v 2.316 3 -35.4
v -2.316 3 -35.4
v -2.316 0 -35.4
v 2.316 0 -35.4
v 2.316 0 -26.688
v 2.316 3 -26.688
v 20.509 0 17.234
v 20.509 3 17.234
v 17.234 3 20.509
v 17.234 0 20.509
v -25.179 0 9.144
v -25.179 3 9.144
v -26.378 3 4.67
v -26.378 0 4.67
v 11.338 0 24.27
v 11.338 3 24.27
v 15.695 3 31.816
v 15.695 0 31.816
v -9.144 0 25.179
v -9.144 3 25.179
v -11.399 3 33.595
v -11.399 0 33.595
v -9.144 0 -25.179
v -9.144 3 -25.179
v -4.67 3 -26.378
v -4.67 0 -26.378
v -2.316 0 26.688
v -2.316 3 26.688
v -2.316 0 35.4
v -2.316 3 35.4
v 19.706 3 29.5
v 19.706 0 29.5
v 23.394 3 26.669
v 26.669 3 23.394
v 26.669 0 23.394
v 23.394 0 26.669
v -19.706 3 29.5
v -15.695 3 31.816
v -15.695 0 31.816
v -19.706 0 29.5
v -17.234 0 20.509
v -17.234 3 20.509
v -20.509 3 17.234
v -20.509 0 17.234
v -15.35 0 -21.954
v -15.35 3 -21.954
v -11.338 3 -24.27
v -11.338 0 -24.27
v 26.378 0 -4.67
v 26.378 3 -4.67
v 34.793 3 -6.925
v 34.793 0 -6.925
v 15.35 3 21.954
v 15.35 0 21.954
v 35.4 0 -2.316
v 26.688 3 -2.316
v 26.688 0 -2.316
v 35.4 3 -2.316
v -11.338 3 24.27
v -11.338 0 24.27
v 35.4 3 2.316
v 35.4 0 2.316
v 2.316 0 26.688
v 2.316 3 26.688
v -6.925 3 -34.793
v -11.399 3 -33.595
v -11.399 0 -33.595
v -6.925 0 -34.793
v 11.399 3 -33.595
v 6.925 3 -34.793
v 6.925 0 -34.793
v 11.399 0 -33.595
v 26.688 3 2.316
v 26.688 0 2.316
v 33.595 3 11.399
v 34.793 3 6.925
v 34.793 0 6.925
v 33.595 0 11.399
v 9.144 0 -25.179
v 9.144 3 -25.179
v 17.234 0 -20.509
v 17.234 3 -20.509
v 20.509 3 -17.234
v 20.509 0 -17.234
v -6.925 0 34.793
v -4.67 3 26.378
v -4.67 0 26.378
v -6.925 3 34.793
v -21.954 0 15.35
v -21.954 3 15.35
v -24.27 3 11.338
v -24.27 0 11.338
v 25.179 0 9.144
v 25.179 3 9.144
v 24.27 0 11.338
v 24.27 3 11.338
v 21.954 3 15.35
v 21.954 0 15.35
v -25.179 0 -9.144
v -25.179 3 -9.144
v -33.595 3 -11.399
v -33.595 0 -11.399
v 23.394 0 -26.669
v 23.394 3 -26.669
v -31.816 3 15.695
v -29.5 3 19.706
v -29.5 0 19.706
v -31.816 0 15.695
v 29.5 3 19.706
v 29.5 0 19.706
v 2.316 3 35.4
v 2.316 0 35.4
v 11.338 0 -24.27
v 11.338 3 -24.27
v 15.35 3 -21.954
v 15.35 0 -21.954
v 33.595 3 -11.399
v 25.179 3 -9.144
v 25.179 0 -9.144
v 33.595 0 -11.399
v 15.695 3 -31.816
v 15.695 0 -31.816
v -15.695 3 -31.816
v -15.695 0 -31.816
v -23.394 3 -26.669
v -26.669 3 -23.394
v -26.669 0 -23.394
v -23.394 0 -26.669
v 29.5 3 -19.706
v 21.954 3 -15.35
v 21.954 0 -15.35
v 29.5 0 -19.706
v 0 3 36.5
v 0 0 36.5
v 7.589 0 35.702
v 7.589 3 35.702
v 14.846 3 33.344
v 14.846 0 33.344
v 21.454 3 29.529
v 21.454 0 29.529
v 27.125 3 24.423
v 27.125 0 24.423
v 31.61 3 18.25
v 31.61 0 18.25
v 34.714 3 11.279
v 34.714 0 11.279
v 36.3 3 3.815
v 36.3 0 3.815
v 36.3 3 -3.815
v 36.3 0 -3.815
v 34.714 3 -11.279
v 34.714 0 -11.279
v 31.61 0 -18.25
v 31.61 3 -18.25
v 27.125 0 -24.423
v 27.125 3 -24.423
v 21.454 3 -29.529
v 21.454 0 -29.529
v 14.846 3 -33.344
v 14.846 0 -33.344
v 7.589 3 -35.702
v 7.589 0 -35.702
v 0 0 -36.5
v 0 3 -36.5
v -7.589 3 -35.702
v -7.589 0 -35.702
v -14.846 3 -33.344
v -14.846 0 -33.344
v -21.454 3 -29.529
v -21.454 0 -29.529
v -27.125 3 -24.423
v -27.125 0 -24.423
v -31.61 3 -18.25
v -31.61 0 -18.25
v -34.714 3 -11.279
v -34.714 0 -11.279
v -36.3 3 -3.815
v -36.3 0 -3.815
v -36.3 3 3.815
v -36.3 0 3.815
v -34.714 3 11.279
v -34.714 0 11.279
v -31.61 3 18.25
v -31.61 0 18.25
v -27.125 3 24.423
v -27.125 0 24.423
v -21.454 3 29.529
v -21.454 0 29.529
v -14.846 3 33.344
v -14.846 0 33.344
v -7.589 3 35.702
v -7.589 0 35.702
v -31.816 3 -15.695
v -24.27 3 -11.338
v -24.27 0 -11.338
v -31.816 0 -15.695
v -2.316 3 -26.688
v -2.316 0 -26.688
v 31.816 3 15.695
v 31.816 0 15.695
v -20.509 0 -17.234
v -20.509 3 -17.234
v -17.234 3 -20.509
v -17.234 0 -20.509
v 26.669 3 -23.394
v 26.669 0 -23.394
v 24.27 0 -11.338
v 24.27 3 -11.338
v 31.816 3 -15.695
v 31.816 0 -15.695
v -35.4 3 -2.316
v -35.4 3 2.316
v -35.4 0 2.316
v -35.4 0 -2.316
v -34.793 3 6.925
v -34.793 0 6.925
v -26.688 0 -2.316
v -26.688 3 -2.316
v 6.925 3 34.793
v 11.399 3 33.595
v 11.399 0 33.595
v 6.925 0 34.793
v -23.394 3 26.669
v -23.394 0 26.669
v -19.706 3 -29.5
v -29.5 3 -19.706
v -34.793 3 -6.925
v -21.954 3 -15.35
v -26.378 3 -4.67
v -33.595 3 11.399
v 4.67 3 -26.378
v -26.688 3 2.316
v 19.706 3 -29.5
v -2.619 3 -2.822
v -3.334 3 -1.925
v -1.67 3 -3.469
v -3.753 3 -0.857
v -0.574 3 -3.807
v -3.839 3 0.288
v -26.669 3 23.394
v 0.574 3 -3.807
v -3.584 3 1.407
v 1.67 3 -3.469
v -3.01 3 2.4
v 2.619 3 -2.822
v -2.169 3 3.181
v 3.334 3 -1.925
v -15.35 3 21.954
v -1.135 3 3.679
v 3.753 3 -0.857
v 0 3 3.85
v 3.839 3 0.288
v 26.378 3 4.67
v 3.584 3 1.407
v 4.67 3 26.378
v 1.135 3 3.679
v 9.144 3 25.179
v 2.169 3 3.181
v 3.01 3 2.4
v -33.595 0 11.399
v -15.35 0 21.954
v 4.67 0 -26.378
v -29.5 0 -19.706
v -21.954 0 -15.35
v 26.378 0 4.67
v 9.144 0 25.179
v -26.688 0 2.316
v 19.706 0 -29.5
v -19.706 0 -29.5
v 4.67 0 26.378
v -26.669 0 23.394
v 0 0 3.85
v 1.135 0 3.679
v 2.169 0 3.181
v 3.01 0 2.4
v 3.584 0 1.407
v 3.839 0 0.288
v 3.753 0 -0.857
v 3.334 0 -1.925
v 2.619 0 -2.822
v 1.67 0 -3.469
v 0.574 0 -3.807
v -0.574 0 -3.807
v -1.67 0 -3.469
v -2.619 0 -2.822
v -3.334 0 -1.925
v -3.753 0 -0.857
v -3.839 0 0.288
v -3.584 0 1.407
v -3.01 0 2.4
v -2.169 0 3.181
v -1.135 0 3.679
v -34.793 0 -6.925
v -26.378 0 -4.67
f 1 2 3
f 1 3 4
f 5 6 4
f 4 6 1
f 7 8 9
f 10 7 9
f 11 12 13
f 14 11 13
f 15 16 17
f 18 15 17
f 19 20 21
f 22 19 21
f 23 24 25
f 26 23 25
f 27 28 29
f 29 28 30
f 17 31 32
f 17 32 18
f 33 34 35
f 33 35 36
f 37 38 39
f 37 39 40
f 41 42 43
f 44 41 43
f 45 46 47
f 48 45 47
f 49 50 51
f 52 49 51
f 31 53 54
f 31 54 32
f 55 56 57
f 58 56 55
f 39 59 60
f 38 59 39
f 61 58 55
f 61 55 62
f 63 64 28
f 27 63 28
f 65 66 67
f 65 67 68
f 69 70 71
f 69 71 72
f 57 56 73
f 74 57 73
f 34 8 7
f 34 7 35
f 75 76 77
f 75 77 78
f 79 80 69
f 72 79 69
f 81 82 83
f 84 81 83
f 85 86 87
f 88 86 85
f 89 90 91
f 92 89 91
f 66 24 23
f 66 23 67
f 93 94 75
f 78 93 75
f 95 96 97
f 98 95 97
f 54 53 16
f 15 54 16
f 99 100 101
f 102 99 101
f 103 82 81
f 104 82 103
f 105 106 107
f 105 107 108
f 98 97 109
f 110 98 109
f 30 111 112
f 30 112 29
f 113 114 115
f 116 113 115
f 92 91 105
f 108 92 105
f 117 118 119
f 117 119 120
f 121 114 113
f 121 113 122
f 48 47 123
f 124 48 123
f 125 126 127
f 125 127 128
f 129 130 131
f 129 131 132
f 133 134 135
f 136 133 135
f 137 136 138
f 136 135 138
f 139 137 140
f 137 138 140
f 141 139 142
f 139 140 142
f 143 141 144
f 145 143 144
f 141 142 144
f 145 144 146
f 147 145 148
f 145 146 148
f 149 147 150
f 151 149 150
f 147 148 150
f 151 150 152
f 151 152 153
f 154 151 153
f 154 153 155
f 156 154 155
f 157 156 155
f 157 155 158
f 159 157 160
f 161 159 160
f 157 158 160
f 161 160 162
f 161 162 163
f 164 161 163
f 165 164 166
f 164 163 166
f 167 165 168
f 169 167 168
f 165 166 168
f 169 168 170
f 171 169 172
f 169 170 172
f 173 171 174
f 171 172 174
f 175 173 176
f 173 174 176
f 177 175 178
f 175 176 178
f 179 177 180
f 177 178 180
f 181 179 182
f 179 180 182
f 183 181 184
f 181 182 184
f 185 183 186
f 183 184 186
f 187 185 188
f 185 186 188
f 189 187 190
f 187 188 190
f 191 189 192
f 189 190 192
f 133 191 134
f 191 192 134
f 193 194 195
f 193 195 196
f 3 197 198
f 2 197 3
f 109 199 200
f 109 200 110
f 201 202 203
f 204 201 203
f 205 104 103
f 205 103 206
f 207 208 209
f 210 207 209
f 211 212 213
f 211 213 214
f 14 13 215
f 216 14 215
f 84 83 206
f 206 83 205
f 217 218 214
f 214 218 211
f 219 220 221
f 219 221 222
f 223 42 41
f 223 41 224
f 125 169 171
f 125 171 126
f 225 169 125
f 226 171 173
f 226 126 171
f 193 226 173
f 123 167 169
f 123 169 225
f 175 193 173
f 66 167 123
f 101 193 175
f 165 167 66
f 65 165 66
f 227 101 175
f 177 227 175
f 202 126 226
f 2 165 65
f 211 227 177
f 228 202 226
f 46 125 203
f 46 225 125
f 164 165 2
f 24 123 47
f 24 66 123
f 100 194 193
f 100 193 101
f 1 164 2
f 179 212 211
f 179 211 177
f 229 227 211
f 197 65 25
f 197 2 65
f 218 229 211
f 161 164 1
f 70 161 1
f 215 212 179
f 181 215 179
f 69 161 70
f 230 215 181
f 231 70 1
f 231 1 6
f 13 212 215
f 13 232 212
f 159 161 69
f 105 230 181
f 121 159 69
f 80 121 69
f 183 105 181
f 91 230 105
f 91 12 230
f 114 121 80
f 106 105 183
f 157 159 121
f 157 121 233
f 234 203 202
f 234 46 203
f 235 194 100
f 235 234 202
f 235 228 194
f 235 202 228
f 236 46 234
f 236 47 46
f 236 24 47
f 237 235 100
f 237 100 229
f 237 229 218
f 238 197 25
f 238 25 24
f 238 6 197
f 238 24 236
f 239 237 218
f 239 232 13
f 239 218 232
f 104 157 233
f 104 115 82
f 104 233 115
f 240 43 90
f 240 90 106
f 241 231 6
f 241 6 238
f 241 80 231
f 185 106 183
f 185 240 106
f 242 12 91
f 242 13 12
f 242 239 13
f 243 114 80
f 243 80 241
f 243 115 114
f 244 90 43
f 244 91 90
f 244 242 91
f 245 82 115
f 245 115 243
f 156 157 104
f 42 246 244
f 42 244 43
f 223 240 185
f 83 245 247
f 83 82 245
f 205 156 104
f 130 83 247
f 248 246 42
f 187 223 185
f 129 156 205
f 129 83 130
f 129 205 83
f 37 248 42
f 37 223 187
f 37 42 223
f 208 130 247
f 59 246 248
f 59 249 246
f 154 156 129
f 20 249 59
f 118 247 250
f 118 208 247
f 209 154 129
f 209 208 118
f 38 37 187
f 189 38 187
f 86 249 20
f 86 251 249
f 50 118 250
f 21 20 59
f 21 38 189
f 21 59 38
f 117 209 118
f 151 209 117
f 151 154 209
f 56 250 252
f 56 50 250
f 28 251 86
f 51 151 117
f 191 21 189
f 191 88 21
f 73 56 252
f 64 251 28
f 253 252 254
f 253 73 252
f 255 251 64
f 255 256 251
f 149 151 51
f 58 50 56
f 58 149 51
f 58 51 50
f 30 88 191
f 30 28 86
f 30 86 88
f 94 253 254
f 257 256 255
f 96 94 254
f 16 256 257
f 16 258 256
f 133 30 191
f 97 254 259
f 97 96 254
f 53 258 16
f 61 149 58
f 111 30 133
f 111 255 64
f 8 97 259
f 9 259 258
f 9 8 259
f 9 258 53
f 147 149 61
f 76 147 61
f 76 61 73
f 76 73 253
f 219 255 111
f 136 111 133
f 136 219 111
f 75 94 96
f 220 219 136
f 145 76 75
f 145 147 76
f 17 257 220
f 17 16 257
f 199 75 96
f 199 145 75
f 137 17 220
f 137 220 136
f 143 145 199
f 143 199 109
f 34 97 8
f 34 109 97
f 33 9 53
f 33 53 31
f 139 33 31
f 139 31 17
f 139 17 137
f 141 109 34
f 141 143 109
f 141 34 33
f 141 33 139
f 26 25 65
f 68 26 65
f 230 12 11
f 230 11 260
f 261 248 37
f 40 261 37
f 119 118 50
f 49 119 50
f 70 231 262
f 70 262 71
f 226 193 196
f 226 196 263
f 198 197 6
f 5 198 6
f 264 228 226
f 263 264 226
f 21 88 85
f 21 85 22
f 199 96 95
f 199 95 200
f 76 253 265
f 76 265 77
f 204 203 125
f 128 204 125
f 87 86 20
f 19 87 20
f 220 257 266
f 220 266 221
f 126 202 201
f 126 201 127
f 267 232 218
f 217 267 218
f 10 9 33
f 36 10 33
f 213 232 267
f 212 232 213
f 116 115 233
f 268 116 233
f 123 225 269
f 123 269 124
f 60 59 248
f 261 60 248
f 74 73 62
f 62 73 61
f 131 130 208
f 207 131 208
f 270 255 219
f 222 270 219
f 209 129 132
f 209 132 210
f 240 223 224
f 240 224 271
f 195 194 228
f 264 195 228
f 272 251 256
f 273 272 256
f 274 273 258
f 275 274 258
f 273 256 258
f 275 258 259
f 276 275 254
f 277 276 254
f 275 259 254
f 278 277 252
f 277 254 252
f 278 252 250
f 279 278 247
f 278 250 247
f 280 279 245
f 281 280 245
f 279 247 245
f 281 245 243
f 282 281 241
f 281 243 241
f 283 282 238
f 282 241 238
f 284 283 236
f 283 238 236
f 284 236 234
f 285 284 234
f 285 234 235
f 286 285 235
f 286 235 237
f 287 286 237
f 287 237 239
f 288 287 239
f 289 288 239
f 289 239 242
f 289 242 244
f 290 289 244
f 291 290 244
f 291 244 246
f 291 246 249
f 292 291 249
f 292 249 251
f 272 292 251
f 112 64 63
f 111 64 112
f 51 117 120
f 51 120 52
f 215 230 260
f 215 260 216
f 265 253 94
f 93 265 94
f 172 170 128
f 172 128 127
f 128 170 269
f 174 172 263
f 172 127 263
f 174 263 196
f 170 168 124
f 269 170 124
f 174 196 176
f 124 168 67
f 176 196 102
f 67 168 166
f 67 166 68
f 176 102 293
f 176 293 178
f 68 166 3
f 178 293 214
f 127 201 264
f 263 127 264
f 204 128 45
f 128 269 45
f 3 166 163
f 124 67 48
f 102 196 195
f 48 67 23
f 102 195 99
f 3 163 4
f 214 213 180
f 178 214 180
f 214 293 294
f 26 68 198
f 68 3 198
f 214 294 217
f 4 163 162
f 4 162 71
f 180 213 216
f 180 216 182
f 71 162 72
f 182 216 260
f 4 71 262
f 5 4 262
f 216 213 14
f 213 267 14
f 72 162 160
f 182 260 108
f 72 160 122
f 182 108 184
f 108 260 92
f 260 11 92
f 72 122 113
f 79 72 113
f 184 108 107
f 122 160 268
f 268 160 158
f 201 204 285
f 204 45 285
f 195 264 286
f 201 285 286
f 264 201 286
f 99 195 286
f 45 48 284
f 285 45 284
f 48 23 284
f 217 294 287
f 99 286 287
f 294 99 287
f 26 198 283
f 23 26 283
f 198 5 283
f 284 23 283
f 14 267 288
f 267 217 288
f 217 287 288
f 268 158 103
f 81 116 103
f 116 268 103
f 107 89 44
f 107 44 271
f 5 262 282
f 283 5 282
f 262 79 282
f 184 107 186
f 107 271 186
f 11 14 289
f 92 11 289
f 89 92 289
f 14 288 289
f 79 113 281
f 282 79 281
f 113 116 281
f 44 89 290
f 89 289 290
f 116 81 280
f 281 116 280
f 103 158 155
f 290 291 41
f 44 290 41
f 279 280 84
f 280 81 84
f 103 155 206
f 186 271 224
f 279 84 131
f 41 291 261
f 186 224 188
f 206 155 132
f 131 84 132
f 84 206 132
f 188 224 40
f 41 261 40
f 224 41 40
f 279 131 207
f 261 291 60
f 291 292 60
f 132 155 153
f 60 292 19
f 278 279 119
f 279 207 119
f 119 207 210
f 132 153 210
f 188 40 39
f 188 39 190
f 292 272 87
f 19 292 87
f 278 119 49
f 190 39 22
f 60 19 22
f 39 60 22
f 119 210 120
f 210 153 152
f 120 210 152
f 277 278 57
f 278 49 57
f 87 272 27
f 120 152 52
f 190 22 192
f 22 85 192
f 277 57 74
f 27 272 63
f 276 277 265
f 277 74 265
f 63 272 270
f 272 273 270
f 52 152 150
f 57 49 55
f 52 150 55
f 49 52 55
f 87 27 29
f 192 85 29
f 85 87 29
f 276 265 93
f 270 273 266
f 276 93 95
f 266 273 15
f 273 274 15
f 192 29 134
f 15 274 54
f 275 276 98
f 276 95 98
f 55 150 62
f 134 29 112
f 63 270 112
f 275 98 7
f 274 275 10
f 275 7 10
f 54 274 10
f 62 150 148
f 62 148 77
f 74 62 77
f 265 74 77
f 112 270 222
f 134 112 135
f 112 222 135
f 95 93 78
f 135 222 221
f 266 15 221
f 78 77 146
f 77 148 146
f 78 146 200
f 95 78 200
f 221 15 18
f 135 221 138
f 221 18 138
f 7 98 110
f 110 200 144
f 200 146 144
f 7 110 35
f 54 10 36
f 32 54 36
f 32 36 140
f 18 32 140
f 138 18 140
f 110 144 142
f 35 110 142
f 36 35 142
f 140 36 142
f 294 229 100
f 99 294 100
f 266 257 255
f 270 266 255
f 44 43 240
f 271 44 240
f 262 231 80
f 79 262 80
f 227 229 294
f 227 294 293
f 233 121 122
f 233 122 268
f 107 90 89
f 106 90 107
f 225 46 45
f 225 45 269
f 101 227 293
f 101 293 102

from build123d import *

# Parameters (mm, degrees)
SKETCH1_R           = 36.5
BOSS_EXTRUDE1_DEPTH = 3
SKETCH2_R           = 3.85
CUT_EXTRUDE1_DEPTH  = 52.705899083
SKETCH3_W           = 4.631754054
SKETCH3_H           = 8.712386095
CUT_EXTRUDE2_DEPTH  = 52.705899083
CIRPATTERN1_COUNT   = 24


with BuildPart() as part:
    # Sketch1 → Boss-Extrude1 (new body)
    with BuildSketch(Plane(origin=(0, 0, 0), x_dir=(1, 0, 0), z_dir=(0, 1, 0))):
        with Locations(Location((0, 0, 0), (0, 0, 270))):
            Circle(SKETCH1_R)
    extrude(amount=BOSS_EXTRUDE1_DEPTH)

    # Sketch2 → Cut-Extrude1 (cut, through all)
    with BuildSketch(Plane(origin=(0, 3, 0), x_dir=(1, 0, 0), z_dir=(0, 1, 0))):
        with Locations(Location((0, 0, 0), (0, 0, 270))):
            Circle(SKETCH2_R)
    extrude(amount=-CUT_EXTRUDE1_DEPTH, mode=Mode.SUBTRACT)

    # Sketch3 → Cut-Extrude2 (cut, through all)
    with BuildSketch(Plane(origin=(0, 3, 0), x_dir=(1, 0, 0), z_dir=(0, 1, 0))):
        with Locations((0, 31.044114287)):
            Rectangle(SKETCH3_W, SKETCH3_H)
    cut_extrude2 = extrude(amount=-CUT_EXTRUDE2_DEPTH, mode=Mode.SUBTRACT)

    # CirPattern1: Cut-Extrude2 ×24 about axis
    cirpattern1_axis = Axis((0, 0, 0), (0, 1, 0))
    for i in range(1, CIRPATTERN1_COUNT):
        add(cut_extrude2.rotate(cirpattern1_axis, i * 360 / CIRPATTERN1_COUNT), mode=Mode.SUBTRACT)


solid = part.part
